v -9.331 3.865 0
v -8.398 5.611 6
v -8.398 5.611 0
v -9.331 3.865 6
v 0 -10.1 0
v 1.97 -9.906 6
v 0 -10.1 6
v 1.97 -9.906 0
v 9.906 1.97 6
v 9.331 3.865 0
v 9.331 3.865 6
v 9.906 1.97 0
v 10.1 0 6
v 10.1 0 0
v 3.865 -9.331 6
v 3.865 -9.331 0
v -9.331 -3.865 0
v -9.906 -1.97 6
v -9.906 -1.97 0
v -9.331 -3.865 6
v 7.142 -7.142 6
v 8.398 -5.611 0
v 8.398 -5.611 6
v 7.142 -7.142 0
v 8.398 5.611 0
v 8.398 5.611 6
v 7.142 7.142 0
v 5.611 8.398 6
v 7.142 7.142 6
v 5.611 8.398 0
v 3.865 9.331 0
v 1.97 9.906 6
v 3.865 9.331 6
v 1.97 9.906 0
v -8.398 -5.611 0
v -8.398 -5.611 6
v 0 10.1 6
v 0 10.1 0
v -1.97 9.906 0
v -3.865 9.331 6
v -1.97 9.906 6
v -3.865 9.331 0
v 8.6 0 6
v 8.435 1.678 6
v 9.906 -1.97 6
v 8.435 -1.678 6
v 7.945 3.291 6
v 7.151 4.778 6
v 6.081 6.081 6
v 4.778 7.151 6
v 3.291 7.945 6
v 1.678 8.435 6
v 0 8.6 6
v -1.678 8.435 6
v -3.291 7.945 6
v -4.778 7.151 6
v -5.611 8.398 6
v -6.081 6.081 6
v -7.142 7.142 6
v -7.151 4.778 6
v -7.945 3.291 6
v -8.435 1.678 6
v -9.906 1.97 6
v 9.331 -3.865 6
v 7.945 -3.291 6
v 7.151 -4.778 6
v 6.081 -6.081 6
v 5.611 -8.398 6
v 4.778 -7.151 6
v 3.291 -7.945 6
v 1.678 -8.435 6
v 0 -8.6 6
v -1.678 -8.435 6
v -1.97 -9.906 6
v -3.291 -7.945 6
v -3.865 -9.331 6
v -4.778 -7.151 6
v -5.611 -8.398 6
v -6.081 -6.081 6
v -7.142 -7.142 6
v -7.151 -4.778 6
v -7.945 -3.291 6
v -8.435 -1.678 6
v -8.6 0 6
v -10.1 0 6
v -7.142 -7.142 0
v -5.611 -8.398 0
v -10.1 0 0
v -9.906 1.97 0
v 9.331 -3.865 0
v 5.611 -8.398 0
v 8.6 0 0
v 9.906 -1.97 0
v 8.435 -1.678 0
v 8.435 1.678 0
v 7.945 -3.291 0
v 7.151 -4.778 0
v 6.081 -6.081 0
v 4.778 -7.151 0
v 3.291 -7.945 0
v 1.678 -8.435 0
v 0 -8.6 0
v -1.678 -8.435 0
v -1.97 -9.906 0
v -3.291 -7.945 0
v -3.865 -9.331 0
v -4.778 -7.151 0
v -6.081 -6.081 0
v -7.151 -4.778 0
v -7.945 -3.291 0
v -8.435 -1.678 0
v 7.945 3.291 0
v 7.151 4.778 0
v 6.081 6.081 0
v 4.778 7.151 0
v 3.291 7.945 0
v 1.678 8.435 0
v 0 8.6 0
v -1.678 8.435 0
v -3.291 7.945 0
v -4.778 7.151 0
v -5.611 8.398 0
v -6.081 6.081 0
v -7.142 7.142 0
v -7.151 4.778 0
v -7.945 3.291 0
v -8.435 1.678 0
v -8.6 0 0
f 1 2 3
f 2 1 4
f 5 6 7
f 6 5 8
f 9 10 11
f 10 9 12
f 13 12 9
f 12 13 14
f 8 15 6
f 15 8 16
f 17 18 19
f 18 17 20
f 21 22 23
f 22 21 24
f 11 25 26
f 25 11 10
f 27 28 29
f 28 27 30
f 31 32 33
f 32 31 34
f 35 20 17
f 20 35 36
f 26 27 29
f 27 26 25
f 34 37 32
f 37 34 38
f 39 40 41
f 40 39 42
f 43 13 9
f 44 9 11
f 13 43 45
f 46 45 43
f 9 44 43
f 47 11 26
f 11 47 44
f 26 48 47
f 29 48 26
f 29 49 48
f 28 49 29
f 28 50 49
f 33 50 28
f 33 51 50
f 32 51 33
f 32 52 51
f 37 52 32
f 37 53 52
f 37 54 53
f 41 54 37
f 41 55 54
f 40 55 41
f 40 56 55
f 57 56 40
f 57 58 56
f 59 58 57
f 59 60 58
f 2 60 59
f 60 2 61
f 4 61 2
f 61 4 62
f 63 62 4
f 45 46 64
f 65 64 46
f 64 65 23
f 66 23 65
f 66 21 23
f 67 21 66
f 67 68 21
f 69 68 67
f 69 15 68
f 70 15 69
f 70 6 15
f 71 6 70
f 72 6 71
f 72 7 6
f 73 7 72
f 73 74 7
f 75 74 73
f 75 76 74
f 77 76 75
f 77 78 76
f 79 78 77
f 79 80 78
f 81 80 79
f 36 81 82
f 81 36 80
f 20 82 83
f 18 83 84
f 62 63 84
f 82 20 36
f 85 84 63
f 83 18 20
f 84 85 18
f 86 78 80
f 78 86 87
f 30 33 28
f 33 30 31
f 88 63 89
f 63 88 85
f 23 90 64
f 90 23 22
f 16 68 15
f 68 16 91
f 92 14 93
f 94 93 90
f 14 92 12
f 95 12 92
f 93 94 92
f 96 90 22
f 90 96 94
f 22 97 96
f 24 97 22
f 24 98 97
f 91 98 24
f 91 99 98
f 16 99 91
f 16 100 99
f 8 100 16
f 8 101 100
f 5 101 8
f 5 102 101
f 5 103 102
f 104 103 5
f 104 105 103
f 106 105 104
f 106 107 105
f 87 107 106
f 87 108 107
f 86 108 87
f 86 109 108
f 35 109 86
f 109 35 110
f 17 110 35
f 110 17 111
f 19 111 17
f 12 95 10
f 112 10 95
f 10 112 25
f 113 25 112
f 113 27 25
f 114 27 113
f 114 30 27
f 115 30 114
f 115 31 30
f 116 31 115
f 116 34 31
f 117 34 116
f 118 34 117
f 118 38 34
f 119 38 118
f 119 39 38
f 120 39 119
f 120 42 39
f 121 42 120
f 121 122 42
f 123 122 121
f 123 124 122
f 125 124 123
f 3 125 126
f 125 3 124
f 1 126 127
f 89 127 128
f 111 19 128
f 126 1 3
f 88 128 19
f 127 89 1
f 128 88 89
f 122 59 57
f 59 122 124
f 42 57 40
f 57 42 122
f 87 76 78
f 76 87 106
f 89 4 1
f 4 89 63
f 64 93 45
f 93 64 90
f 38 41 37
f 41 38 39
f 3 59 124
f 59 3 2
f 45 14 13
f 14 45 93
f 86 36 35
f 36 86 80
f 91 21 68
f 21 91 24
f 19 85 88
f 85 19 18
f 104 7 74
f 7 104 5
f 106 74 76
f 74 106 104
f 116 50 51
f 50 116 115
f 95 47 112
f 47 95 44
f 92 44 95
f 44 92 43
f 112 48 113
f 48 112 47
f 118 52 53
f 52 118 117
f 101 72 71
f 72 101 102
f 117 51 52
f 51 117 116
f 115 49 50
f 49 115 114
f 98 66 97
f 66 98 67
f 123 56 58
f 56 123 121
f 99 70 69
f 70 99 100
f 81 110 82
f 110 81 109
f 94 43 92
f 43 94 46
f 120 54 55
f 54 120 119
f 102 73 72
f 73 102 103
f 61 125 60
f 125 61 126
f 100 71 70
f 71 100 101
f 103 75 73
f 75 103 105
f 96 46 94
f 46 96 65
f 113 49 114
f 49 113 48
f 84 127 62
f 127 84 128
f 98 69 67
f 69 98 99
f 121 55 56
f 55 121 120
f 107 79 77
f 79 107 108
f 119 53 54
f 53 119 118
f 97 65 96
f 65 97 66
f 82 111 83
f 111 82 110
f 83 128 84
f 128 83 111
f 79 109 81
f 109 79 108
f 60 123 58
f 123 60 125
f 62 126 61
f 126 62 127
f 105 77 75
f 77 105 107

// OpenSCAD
$fn = 32;

// ----------------------------------------------------------------------
// Spacer sleeve: 20.2 / 17.2 x 6 mm
// ----------------------------------------------------------------------

// --- parameters (mm) ---
tube_d = 20.2;            // outside diameter
bore_d = 17.2;            // shaft bore
tube_l = 6;               // sleeve length

module sleeve() {
  cylinder(h = tube_l, d = tube_d);
}

difference() {
  sleeve();
  translate([0, 0, -1]) cylinder(h = tube_l + 2, d = bore_d);
}
